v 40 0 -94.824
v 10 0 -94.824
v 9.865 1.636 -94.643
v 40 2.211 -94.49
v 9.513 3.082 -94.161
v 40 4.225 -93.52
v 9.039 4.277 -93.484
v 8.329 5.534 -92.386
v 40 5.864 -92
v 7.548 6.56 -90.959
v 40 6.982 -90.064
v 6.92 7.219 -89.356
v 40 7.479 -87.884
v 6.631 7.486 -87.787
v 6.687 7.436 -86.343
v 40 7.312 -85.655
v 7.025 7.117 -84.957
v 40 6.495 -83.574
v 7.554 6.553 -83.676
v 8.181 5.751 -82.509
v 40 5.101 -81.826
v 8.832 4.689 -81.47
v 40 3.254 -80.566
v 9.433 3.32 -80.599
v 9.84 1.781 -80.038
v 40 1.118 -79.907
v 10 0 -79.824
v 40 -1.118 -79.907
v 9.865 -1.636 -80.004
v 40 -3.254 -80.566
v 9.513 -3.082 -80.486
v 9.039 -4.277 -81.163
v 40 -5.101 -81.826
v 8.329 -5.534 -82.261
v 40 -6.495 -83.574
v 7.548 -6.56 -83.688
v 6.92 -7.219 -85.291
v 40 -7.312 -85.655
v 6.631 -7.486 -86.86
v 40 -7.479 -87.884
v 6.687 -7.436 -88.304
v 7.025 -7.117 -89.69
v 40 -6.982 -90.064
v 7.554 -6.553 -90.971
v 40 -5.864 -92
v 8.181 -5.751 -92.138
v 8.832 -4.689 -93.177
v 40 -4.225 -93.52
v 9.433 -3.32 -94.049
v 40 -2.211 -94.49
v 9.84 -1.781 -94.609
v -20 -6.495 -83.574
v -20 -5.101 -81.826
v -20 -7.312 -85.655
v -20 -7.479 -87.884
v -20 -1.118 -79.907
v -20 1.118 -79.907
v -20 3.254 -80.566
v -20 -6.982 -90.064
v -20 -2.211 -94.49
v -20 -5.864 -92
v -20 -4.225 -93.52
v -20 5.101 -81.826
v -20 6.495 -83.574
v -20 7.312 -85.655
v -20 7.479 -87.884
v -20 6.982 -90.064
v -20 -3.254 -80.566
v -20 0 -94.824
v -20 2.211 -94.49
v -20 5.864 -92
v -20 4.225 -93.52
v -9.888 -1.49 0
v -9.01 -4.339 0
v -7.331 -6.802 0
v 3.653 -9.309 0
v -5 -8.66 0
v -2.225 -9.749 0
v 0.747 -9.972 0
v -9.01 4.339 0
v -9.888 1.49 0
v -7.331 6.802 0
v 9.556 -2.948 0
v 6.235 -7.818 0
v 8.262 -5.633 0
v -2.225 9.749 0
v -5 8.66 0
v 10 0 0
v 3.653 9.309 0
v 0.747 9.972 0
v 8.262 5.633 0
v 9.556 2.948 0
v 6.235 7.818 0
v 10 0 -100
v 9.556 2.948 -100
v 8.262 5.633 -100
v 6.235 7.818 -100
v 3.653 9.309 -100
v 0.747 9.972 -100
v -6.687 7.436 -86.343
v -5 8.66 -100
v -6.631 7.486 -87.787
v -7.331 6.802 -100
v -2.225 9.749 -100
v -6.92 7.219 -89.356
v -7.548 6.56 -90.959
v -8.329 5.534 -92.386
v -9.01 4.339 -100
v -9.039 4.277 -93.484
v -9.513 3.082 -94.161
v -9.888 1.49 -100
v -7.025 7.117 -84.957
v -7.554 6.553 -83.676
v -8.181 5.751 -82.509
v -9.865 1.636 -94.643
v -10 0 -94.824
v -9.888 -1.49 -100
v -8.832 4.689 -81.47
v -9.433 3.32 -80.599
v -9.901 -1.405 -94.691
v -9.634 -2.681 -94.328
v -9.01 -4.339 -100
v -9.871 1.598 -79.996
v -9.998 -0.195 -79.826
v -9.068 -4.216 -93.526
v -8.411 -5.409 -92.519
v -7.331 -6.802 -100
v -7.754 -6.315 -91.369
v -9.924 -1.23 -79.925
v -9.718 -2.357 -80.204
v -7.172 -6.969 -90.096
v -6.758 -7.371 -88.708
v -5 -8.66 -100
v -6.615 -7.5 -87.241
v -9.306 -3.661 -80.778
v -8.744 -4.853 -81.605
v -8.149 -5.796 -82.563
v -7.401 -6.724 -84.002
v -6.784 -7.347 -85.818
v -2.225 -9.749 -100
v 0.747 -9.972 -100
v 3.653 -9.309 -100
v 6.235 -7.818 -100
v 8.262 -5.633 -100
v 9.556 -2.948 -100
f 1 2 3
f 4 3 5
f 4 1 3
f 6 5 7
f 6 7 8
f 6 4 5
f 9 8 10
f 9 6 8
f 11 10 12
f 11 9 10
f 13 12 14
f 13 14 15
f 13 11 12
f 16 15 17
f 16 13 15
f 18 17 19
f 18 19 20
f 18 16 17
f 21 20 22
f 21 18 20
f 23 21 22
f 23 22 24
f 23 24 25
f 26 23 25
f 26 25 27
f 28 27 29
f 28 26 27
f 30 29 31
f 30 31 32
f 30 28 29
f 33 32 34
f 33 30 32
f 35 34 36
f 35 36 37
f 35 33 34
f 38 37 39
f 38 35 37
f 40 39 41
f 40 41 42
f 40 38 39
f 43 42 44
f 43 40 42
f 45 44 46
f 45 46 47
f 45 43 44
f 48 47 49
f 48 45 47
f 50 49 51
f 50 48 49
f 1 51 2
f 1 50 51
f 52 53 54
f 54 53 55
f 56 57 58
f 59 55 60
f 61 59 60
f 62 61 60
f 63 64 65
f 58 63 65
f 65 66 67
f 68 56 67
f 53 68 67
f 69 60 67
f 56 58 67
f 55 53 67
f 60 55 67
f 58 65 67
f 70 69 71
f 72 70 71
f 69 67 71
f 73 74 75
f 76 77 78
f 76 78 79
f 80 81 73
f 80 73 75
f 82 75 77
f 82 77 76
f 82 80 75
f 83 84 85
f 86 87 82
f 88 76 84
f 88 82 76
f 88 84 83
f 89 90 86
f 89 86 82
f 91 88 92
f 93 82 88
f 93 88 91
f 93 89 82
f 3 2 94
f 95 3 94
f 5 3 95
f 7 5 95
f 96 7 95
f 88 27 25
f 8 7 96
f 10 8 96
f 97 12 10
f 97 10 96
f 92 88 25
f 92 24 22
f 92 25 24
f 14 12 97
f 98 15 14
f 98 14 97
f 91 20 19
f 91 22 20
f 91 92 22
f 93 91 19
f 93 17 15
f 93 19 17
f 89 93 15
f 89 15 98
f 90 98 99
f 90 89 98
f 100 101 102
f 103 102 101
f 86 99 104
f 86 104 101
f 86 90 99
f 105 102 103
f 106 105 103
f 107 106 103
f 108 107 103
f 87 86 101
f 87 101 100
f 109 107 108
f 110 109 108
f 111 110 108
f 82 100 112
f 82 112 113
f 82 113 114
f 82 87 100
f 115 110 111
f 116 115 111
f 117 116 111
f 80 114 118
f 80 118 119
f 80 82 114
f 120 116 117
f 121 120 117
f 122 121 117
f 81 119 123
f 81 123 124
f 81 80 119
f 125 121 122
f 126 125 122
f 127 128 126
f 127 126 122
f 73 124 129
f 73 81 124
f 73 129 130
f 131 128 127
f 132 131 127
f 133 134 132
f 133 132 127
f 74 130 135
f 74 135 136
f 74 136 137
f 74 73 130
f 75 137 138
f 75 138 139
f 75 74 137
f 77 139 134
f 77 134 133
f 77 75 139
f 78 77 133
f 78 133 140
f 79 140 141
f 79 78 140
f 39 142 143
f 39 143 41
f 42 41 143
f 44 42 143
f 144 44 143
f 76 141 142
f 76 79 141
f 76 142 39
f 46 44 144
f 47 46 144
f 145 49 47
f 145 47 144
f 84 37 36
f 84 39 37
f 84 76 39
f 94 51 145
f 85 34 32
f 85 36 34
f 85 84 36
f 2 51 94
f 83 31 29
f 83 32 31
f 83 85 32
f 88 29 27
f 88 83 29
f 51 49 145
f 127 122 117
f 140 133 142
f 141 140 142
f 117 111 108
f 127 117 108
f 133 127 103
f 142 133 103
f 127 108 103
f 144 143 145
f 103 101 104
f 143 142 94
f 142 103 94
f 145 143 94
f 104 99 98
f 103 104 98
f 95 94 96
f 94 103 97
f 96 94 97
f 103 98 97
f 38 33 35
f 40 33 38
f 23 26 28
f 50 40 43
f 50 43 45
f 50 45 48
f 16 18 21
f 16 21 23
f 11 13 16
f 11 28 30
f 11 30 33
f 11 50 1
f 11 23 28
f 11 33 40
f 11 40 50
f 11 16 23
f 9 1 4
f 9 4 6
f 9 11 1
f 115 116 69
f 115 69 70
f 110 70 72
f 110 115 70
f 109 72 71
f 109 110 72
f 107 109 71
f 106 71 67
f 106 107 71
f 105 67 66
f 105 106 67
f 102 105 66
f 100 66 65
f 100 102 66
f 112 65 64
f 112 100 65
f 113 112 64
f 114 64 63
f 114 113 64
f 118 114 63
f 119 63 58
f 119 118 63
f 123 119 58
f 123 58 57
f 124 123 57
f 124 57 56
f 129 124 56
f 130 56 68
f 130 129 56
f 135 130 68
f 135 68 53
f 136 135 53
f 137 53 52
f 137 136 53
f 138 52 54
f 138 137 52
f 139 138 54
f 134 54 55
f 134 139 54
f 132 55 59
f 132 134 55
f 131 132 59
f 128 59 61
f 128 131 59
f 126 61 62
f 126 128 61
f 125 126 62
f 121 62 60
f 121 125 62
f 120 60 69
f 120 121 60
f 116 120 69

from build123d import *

# Parameters (mm, degrees)
CROQUIS1_R              = 10
SALIENTE_EXTRUIR1_DEPTH = 100
CROQUIS2_R              = 7.5
SALIENTE_EXTRUIR2_DEPTH = 30


with BuildPart() as part:
    # Croquis1 → Saliente-Extruir1 (new body)
    with BuildSketch(Plane.XY):
        Circle(CROQUIS1_R)
    extrude(amount=-SALIENTE_EXTRUIR1_DEPTH)

    # Croquis2 → Saliente-Extruir2 (add, symmetric)
    with BuildSketch(Plane(origin=(10, 0, 0), x_dir=(0, 0, -1), z_dir=(1, 0, 0))):
        with Locations((87.3235533, 0)):
            Circle(CROQUIS2_R)
    extrude(amount=SALIENTE_EXTRUIR2_DEPTH, both=True)


solid = part.part
